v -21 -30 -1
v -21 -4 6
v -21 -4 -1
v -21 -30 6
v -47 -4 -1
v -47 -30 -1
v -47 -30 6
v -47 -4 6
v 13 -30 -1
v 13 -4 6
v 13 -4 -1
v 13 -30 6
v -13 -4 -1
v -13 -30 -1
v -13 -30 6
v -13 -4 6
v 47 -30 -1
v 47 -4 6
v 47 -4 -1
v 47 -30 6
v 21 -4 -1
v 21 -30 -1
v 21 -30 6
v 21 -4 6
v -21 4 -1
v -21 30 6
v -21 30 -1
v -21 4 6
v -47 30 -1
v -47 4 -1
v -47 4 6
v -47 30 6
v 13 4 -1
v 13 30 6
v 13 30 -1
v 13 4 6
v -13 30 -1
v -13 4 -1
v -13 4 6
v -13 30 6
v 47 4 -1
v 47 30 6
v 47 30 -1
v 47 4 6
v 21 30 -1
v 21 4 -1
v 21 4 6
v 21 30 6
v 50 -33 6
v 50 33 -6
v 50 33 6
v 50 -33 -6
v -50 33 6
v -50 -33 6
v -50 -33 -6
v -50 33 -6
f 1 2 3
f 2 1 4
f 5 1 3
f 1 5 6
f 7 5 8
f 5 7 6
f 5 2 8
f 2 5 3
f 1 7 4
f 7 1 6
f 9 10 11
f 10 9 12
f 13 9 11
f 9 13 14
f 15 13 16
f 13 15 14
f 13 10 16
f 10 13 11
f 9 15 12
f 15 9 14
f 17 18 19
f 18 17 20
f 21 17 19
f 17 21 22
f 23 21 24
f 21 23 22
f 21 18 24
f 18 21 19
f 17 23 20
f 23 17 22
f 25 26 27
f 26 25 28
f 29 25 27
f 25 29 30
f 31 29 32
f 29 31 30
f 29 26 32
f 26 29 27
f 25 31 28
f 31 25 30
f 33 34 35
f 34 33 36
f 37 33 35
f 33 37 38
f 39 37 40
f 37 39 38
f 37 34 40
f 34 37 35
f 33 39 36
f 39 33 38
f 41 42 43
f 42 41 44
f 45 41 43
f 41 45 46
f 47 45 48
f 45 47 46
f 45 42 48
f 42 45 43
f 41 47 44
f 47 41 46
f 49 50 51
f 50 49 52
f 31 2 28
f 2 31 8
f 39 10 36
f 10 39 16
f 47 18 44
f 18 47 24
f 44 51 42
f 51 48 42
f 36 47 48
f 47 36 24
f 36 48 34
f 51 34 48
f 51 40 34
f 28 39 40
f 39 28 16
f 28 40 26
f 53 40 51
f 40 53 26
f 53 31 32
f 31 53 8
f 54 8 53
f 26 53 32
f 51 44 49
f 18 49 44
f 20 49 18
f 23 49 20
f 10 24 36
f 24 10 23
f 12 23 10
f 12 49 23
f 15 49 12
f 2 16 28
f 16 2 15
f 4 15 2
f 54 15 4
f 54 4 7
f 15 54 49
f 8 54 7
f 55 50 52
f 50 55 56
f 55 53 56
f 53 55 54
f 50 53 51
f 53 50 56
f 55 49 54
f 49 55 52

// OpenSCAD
$fn = 32;

// ----------------------------------------------------------------------
// Pocket plate 100 x 66 x 12
// 2 x 3 pockets 26 mm square, 7 mm deep
// ----------------------------------------------------------------------

// --- parameters (mm) ---
thickness = 12;  // plate thickness
floor_t = 5;     // material left under each pocket
pocket = 26;     // pocket side length
pitch_x = 34;    // pocket pitch along X
pitch_y = 34;    // pocket pitch along Y
cols = 3;        // pockets per row
rows = 2;        // rows of pockets

// --- derived feature positions (mm) ---
depth = thickness - floor_t;        // = 7   pocket depth, down to the floor
span_x = (cols - 1) * pitch_x;      // = 68   distance between outer pockets
span_y = (rows - 1) * pitch_y;      // = 34   distance between outer pocket rows
origin_x = -span_x / 2;             // = -34   X of the first pocket
origin_y = -span_y / 2;             // = -17   Y of the first pocket
plate = [span_x + pocket + 6, span_y + pocket + 6, thickness];  // = [100, 66, 12]   overall size: pockets plus 3 mm of wall on each side
feature_centers = [
  [origin_x + 0 * pitch_x, origin_y + 0 * pitch_y],
  [origin_x + 1 * pitch_x, origin_y + 0 * pitch_y],
  [origin_x + 2 * pitch_x, origin_y + 0 * pitch_y],
  [origin_x + 0 * pitch_x, origin_y + 1 * pitch_y],
  [origin_x + 1 * pitch_x, origin_y + 1 * pitch_y],
  [origin_x + 2 * pitch_x, origin_y + 1 * pitch_y]
];   // pocket centres, used verbatim by the cutter loop

// plate outline, then one pocket per centre in feature_centers
difference() {
  cube(plate, center = true);
  for (centre = feature_centers)
    translate([centre[0] - pocket / 2, centre[1] - pocket / 2, plate[2] / 2 - depth])
      cube([pocket, pocket, depth + 1]);  // centred on the declared pocket centre
}
